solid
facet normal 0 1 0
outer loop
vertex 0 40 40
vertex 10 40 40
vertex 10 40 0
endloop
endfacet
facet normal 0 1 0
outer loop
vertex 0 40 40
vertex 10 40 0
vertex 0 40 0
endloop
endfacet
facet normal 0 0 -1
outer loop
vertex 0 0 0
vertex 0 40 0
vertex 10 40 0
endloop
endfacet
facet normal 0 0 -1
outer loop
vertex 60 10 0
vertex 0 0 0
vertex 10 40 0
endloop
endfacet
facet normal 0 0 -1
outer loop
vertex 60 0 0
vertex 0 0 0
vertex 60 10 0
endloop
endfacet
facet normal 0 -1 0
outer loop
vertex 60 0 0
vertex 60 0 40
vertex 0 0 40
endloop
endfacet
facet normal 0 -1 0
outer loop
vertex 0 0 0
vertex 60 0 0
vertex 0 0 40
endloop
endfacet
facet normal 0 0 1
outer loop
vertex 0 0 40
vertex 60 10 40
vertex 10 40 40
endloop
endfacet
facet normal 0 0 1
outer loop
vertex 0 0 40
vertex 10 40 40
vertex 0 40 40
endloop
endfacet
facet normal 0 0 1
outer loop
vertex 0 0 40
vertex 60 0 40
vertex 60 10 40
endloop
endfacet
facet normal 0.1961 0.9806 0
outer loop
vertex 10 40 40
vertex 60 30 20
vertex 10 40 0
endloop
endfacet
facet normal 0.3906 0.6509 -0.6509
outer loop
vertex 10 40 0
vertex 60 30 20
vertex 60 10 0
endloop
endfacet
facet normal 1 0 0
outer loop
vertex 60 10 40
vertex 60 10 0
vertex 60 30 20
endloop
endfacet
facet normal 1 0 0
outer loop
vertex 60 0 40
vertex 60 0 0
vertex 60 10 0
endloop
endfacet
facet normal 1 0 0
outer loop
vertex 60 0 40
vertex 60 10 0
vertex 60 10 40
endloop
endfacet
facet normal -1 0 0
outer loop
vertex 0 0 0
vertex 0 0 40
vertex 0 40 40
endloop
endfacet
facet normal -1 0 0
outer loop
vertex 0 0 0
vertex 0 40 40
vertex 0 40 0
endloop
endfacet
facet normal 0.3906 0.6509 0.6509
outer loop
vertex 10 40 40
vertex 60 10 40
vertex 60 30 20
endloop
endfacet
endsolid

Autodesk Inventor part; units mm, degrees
ref_plane "YZ Plane" through (0, 0, 0) normal (1, 0, 0) x (0, 1, 0)
sketch "草圖1" plane through (0, 0, 0) normal (0, 1, 0) x (-1, 0, 0)
  line L0 (0, 0) -> (-60, 0)
  line L1 (-60, 0) -> (-60, 40)
  line L2 (-60, 40) -> (0, 40)
  line L3 (0, 40) -> (0, 0)
  dimension "d0" = 40
  dimension "d1" = 60
extrude "擠出1" add sketch "草圖1" along normal blind 40
sketch "草圖3" plane through (60, 0, 40) normal (1, 0, 0) x (0, 0, -1)
  line L0 (40, 40) -> (40, 0) projected
  line L1 (40, 0) -> (0, 0) construction
  line L2 (0, 0) -> (0, 40) construction
  line L3 (0, 40) -> (40, 40) construction
  line L4 (40, 40) -> (0, 40) construction
  line L5 (40, 0) -> (40, 40) projected
  line L6 (40, 10) -> (20, 30)
  line L7 (20, 30) -> (40, 40)
  dimension "d14" = 30
  dimension "d15" = 20
  dimension "d16" = 10
ref_plane "工作平面2" through (10, 0, 0) normal (-1, 0, 0) x (0, 0, 1)
sketch "草圖7" plane through (10, 0, 0) normal (-1, 0, 0) x (0, 0, 1)
  line L0 (0, 0) -> (0, 40) construction
  line L1 (0, 40) -> (40, 40) construction
  line L2 (40, 40) -> (40, 0) construction
  line L3 (40, 0) -> (0, 0) construction
loft "斷面混成2" cut profiles "草圖3" section 2 point at (10, 40, 0)
ref_plane "工作平面4" through (0, 0, 20) normal (0, 0, 1) x (1, 0, 0)
mirror "鏡射2" about plane through (0, 0, 20) normal (0, 0, 1) of "斷面混成2"
sketch "草圖18" plane through (60, 0, 0) normal (0, 0, -1) x (-1, 0, 0)
  line L0 (60, 40) -> (60, 0) projected
  line L1 (60, 0) -> (0, 0) projected
  line L2 (0, 0) -> (0, 10) projected
  line L3 (0, 10) -> (50, 40) projected
  line L4 (50, 40) -> (60, 40) projected
  line L5 (50, 40) -> (0, 40) projected
  line L6 (60, 40) -> (50, 40) projected
  line L7 (0, 30) -> (50, 40) projected
  line L8 (50, 40) -> (0, 30)
  line L9 (0, 30) -> (0, 40)
  line L10 (50, 40) -> (0, 40) projected
  line L11 (0, 40) -> (50, 40)
extrude "擠出2" cut sketch "草圖18" against normal blind 45 contours L7 L9 L5
properties part number "16" material "鋼、碳鋼"
